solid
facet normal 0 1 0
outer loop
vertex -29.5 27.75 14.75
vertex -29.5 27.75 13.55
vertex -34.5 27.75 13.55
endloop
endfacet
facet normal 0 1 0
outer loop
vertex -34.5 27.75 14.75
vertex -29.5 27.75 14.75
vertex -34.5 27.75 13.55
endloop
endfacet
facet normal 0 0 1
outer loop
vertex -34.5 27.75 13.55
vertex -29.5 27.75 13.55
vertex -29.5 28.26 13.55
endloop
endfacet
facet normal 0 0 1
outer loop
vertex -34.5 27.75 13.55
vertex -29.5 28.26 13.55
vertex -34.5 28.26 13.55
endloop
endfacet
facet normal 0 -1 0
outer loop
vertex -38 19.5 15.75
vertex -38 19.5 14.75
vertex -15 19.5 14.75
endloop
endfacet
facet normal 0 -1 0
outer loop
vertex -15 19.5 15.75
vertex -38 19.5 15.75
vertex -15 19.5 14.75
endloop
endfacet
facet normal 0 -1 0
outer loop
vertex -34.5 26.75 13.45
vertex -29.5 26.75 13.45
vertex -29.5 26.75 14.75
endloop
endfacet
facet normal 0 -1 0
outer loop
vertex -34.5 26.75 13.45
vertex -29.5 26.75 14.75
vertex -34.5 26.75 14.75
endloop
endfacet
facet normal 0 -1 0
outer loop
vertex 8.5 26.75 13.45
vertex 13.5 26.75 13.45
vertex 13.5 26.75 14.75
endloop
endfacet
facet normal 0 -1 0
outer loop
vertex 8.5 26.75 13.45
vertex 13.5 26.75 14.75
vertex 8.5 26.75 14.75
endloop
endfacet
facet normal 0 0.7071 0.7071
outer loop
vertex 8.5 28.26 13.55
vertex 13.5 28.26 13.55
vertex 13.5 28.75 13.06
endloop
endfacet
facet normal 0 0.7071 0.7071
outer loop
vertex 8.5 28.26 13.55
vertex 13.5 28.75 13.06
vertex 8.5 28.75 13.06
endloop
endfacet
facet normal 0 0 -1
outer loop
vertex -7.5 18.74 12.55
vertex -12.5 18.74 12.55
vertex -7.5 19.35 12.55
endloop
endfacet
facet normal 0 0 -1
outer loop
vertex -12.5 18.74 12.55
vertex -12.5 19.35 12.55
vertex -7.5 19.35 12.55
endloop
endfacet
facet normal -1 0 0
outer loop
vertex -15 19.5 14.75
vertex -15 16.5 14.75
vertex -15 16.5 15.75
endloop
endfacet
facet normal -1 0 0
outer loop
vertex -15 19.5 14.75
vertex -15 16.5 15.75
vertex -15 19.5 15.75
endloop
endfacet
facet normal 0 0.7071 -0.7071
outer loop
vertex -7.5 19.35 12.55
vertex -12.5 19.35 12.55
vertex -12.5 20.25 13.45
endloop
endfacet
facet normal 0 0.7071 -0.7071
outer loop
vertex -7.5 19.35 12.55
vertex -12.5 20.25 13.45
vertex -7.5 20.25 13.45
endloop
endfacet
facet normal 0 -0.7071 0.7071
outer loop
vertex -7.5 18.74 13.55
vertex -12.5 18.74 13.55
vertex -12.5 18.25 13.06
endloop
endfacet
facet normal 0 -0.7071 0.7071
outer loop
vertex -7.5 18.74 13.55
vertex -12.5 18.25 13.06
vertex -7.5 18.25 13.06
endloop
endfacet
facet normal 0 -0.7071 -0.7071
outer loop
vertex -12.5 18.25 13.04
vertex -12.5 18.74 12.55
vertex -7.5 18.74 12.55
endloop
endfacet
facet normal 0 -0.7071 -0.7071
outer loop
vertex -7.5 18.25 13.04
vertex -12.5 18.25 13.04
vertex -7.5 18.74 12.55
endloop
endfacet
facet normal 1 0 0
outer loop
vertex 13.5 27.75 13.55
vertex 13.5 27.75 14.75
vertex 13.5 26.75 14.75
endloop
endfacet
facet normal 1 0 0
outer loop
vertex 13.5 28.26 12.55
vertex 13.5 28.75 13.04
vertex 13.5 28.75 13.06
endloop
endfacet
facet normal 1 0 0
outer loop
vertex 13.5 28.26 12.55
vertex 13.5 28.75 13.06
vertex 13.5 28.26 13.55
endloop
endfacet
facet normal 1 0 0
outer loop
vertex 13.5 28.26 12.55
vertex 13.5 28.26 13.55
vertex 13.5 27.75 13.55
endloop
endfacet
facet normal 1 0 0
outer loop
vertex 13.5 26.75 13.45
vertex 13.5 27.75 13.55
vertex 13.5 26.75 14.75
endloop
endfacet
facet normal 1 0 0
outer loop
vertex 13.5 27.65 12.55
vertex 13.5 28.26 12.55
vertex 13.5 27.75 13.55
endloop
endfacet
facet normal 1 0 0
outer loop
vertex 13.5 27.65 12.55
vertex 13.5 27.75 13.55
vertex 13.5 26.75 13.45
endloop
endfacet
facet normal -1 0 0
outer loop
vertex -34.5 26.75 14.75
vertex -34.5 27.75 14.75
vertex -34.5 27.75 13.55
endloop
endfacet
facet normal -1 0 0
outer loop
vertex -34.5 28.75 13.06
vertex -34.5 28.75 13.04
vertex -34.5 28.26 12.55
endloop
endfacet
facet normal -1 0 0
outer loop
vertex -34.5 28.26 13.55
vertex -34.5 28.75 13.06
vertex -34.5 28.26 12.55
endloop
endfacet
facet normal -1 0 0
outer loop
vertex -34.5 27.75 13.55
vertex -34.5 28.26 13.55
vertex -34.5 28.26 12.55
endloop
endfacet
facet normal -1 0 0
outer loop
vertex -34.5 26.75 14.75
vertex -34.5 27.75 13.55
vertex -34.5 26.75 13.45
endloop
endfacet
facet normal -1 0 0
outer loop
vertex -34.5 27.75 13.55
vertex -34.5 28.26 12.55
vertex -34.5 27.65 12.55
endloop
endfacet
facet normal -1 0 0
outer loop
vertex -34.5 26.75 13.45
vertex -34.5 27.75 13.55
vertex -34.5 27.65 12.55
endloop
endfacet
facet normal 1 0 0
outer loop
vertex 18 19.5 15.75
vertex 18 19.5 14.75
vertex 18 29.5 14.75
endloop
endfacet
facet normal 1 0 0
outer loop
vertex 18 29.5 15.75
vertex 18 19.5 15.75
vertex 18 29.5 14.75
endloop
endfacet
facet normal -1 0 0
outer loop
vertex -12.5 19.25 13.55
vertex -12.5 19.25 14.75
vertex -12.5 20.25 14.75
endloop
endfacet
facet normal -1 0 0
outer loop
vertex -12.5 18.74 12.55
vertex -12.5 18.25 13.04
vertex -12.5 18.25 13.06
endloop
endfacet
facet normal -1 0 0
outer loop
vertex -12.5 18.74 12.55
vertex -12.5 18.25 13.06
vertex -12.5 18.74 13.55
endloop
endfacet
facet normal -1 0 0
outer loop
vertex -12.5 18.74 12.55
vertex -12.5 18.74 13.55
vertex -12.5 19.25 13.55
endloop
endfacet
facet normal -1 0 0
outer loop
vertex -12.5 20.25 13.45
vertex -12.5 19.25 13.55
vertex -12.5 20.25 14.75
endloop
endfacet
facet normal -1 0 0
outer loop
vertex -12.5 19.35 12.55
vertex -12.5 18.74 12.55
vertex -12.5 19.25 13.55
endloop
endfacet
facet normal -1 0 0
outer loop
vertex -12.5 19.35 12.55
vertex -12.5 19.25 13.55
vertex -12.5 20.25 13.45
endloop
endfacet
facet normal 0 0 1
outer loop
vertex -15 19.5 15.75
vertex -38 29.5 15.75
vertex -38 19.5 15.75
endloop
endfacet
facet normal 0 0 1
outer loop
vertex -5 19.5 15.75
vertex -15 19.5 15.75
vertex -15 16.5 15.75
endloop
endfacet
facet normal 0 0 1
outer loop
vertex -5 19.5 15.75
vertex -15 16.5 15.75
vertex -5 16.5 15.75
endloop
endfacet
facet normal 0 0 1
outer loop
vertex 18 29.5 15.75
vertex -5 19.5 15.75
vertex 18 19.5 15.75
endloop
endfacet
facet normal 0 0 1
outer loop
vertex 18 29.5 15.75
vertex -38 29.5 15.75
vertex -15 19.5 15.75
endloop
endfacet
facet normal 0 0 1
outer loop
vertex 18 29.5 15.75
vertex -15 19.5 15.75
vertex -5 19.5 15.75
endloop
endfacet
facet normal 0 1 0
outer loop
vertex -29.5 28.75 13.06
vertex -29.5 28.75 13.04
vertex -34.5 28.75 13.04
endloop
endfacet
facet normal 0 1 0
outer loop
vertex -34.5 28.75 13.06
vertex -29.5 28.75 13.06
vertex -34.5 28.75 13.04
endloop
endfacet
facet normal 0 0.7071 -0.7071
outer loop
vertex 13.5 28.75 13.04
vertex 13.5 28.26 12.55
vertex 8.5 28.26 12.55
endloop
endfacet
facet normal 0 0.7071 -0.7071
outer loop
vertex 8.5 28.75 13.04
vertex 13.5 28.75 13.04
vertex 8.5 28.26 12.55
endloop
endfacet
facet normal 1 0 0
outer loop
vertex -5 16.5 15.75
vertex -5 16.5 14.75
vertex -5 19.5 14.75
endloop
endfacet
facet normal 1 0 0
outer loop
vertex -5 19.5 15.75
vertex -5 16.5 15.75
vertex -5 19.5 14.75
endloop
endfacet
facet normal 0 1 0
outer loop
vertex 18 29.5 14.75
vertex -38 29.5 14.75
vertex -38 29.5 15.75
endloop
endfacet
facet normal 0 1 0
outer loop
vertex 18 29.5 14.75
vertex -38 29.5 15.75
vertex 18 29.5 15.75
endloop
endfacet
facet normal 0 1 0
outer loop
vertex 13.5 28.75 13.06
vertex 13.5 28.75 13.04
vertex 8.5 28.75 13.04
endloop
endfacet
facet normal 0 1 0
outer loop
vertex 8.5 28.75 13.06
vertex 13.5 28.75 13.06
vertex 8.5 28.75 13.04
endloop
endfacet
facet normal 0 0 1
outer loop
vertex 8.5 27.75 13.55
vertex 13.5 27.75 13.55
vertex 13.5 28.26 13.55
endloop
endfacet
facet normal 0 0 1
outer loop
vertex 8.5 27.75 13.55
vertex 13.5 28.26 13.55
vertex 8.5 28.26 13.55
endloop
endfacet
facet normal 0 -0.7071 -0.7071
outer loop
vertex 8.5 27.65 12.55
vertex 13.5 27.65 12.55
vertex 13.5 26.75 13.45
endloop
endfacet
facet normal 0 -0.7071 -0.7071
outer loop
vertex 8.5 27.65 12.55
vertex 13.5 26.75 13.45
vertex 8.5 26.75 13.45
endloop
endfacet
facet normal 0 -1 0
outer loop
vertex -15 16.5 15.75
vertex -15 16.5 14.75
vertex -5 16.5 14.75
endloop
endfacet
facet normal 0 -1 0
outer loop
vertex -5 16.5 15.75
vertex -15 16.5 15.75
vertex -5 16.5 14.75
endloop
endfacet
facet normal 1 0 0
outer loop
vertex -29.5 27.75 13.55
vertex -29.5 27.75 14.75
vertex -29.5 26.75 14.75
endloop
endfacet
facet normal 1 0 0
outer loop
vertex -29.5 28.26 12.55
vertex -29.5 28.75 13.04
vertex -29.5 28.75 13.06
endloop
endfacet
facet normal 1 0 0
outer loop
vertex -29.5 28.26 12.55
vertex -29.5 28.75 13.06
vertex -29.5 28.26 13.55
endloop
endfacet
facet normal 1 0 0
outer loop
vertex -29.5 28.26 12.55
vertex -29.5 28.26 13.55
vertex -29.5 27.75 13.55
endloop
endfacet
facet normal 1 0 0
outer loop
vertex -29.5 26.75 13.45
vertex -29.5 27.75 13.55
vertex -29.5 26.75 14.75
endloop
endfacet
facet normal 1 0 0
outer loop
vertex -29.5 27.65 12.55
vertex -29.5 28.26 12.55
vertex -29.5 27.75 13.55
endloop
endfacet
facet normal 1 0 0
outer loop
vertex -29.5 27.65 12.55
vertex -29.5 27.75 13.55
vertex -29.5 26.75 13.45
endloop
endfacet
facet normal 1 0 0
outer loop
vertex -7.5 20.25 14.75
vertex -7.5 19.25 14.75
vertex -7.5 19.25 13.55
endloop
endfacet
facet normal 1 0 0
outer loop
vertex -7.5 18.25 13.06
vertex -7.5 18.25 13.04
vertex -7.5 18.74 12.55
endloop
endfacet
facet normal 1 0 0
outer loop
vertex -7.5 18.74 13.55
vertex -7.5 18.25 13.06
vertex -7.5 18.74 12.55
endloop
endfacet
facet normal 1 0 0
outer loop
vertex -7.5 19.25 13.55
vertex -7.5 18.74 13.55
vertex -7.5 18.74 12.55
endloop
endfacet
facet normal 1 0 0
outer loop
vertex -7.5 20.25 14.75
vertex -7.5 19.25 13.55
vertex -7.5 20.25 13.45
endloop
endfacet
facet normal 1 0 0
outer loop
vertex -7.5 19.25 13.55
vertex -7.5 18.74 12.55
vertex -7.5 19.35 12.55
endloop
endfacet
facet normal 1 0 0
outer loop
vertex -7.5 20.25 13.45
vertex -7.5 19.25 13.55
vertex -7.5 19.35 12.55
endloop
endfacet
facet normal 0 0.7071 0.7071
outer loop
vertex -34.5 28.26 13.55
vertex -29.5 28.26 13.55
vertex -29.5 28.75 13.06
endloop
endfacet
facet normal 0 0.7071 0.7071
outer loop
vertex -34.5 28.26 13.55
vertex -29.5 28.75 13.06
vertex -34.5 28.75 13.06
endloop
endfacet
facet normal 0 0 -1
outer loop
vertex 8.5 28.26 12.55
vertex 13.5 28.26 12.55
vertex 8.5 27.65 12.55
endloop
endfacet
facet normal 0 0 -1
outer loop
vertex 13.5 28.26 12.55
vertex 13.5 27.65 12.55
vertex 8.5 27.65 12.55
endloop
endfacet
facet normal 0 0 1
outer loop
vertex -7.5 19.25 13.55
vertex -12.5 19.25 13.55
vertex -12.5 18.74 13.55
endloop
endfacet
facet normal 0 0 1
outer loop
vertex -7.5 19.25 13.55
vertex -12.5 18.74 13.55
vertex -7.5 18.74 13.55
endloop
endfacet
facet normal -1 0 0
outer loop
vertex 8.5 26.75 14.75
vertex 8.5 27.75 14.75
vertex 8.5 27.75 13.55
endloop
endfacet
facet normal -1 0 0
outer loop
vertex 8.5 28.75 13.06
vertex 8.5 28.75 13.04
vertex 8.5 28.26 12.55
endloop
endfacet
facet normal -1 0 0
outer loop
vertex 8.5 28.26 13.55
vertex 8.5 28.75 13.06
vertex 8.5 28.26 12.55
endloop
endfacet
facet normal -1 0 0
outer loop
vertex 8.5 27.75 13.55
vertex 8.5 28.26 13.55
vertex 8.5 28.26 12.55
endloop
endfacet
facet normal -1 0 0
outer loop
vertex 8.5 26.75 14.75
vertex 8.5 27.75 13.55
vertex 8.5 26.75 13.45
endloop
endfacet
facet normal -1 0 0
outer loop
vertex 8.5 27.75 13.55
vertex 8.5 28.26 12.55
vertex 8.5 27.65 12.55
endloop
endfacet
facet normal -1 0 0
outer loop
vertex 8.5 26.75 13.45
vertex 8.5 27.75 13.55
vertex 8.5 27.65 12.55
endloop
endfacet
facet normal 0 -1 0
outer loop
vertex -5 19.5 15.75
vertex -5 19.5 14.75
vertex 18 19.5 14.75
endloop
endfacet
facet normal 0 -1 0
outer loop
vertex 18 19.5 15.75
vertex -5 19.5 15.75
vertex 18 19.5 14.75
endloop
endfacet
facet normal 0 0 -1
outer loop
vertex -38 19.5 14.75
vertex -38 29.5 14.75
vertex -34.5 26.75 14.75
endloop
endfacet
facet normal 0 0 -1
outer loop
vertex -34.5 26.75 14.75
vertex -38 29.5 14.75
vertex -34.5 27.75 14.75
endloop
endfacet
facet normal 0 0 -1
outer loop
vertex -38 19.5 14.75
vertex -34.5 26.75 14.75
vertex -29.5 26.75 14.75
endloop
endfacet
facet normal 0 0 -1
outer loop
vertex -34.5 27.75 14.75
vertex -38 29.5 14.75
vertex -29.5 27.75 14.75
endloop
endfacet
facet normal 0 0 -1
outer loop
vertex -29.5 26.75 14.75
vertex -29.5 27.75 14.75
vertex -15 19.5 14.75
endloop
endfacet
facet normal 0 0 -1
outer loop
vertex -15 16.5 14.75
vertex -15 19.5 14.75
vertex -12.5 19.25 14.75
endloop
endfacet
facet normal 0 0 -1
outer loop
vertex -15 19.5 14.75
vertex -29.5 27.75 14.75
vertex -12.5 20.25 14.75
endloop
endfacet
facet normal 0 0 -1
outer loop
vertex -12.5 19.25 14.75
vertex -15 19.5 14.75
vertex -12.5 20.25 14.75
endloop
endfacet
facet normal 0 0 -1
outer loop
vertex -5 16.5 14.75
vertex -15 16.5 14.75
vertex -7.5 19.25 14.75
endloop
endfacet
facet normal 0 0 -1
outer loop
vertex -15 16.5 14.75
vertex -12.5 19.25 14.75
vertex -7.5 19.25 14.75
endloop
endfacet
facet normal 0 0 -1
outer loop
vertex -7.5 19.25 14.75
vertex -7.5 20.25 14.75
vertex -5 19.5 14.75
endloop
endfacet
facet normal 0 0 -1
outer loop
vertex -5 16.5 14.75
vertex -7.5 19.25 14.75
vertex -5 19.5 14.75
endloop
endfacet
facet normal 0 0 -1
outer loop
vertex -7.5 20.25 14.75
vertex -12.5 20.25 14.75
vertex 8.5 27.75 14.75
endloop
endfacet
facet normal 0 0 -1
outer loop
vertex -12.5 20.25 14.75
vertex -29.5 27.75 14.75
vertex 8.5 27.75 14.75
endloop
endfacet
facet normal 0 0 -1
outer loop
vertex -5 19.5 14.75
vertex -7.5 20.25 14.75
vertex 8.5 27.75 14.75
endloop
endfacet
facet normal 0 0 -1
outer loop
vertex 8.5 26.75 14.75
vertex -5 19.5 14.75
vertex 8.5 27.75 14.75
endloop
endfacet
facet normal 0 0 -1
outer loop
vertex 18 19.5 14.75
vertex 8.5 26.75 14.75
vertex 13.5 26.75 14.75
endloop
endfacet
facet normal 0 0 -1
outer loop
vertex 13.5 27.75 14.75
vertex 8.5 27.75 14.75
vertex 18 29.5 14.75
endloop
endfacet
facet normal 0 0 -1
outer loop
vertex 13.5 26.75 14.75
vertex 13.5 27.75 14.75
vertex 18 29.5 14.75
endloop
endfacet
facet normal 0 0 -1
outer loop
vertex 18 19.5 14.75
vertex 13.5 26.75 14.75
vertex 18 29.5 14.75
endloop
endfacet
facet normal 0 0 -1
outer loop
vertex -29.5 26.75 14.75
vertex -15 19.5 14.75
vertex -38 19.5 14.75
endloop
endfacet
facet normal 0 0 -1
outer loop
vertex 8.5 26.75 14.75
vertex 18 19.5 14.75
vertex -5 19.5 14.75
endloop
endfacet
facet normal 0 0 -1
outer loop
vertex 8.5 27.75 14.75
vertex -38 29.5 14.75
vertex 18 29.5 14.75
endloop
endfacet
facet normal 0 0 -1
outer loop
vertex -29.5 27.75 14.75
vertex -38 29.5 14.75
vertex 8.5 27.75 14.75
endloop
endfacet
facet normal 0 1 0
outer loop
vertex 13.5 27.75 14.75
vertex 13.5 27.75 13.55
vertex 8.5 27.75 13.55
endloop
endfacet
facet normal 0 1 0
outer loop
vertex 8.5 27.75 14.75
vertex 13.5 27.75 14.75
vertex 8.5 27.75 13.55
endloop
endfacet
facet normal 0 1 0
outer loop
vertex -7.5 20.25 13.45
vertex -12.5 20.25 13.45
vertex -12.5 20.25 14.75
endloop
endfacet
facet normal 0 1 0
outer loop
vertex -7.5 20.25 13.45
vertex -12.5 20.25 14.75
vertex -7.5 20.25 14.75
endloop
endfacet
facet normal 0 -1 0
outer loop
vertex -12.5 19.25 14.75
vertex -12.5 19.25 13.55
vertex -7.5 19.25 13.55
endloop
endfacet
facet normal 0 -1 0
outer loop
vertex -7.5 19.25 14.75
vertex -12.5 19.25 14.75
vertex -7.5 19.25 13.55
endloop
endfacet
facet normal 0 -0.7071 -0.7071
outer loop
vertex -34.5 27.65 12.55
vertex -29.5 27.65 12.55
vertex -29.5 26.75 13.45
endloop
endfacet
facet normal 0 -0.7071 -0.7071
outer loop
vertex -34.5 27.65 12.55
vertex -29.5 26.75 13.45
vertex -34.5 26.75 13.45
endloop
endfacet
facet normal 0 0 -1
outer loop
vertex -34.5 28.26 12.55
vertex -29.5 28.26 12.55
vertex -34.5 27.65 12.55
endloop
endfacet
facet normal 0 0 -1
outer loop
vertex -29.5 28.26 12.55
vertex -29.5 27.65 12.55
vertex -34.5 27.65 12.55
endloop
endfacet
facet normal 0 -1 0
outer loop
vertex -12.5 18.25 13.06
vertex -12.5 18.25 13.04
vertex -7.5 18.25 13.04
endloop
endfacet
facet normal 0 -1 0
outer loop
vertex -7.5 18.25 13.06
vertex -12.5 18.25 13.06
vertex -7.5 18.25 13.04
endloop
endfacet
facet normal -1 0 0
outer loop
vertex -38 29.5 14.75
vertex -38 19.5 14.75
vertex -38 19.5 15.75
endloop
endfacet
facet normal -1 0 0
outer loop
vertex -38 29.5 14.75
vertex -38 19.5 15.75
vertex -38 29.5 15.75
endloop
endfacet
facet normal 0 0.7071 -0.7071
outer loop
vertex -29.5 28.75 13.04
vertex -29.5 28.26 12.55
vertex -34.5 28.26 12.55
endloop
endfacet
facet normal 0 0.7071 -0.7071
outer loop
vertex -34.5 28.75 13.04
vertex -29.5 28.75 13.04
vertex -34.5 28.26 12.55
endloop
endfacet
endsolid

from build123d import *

# Parameters (mm, degrees)
BOX082_W                  = 56
BOX082_H                  = 10
BOX082_DEPTH              = 1
BOX081_W                  = 10
BOX081_H                  = 10
BOX081_DEPTH              = 1
BOX085_W                  = 5
BOX085_H                  = 1
BOX085_DEPTH              = 1
CHAMFER013_SIZE           = 0.49
BOX086_W                  = 5
BOX086_H                  = 1
BOX086_DEPTH              = 2.2
CHAMFER014_SIZE           = 0.9
FUSION078_PLACEMENT_ANGLE = 180
BOX088_W                  = 5
BOX088_H                  = 1
BOX088_DEPTH              = 1
CHAMFER015_SIZE           = 0.49
BOX087_W                  = 5
BOX087_H                  = 1
BOX087_DEPTH              = 2.2
CHAMFER016_SIZE           = 0.9
FUSION079_PLACEMENT_ANGLE = 180
BOX083_W                  = 5
BOX083_H                  = 1
BOX083_DEPTH              = 1
CHAMFER011_SIZE           = 0.49
BOX084_W                  = 5
BOX084_H                  = 1
BOX084_DEPTH              = 2.2
CHAMFER012_SIZE           = 0.9


with BuildPart() as w_rfel056:
    # Box082 → Box082 (new body)
    with BuildSketch(Plane(origin=(-38, 19.5, 14.75), x_dir=(1, 0, 0), z_dir=(0, 0, 1))):
        with Locations((28, 5)):
            Rectangle(BOX082_W, BOX082_H)
    extrude(amount=BOX082_DEPTH)


with BuildPart() as deckl:
    # Box081 → Box081 (new body)
    with BuildSketch(Plane(origin=(-15, 16.5, 14.75), x_dir=(1, 0, 0), z_dir=(0, 0, 1))):
        with Locations((5, 5)):
            Rectangle(BOX081_W, BOX081_H)
    extrude(amount=BOX081_DEPTH)

    # Fusion077: union Würfel056
    add(w_rfel056.part)


with BuildPart() as chamfer013:
    # Box085 → Box085 (new body)
    with BuildSketch(Plane(origin=(-12.5, 18.25, 12.75), x_dir=(1, 0, 0), z_dir=(0, 0, 1))):
        with Locations((2.5, 0.5)):
            Rectangle(BOX085_W, BOX085_H)
    extrude(amount=BOX085_DEPTH)

    # Chamfer013
    chamfer013_edges = [chamfer013.edges().sort_by_distance(p)[0] for p in [
        (-10, 18.25, 12.75),
        (-10, 18.25, 13.75),
    ]]
    chamfer(chamfer013_edges, length=CHAMFER013_SIZE)


with BuildPart() as chamfer013_1:
    # Chamfer013 placement: moved
    add(chamfer013.part.moved(Location((0, 0, -0.2))))


with BuildPart() as nase001:
    # Box086 → Box086 (new body)
    with BuildSketch(Plane(origin=(-12.5, 19.25, 12.55), x_dir=(1, 0, 0), z_dir=(0, 0, 1))):
        with Locations((2.5, 0.5)):
            Rectangle(BOX086_W, BOX086_H)
    extrude(amount=BOX086_DEPTH)

    # Chamfer014
    chamfer014_edges = [nase001.edges().sort_by_distance(p)[0] for p in [
        (-10, 20.25, 12.55),
    ]]
    chamfer(chamfer014_edges, length=CHAMFER014_SIZE)

    # Fusion078: union Chamfer013
    add(chamfer013_1.part)


with BuildPart() as nase001_1:
    # Fusion078 placement: moved
    add(nase001.part.moved(Location((1, 47, 0))).rotate(Axis((1, 47, 0), (0, 0, 1)), FUSION078_PLACEMENT_ANGLE))


with BuildPart() as chamfer015:
    # Box088 → Box088 (new body)
    with BuildSketch(Plane(origin=(-12.5, 18.25, 12.75), x_dir=(1, 0, 0), z_dir=(0, 0, 1))):
        with Locations((2.5, 0.5)):
            Rectangle(BOX088_W, BOX088_H)
    extrude(amount=BOX088_DEPTH)

    # Chamfer015
    chamfer015_edges = [chamfer015.edges().sort_by_distance(p)[0] for p in [
        (-10, 18.25, 12.75),
        (-10, 18.25, 13.75),
    ]]
    chamfer(chamfer015_edges, length=CHAMFER015_SIZE)


with BuildPart() as chamfer015_1:
    # Chamfer015 placement: moved
    add(chamfer015.part.moved(Location((0, 0, -0.2))))


with BuildPart() as nase002:
    # Box087 → Box087 (new body)
    with BuildSketch(Plane(origin=(-12.5, 19.25, 12.55), x_dir=(1, 0, 0), z_dir=(0, 0, 1))):
        with Locations((2.5, 0.5)):
            Rectangle(BOX087_W, BOX087_H)
    extrude(amount=BOX087_DEPTH)

    # Chamfer016
    chamfer016_edges = [nase002.edges().sort_by_distance(p)[0] for p in [
        (-10, 20.25, 12.55),
    ]]
    chamfer(chamfer016_edges, length=CHAMFER016_SIZE)

    # Fusion079: union Chamfer015
    add(chamfer015_1.part)


with BuildPart() as nase002_1:
    # Fusion079 placement: moved
    add(nase002.part.moved(Location((-42, 47, 0))).rotate(Axis((-42, 47, 0), (0, 0, 1)), FUSION079_PLACEMENT_ANGLE))


with BuildPart() as chamfer011:
    # Box083 → Box083 (new body)
    with BuildSketch(Plane(origin=(-12.5, 18.25, 12.75), x_dir=(1, 0, 0), z_dir=(0, 0, 1))):
        with Locations((2.5, 0.5)):
            Rectangle(BOX083_W, BOX083_H)
    extrude(amount=BOX083_DEPTH)

    # Chamfer011
    chamfer011_edges = [chamfer011.edges().sort_by_distance(p)[0] for p in [
        (-10, 18.25, 12.75),
        (-10, 18.25, 13.75),
    ]]
    chamfer(chamfer011_edges, length=CHAMFER011_SIZE)


with BuildPart() as chamfer011_1:
    # Chamfer011 placement: moved
    add(chamfer011.part.moved(Location((0, 0, -0.2))))


with BuildPart() as abdeckung_gpio:
    # Box084 → Box084 (new body)
    with BuildSketch(Plane(origin=(-12.5, 19.25, 12.55), x_dir=(1, 0, 0), z_dir=(0, 0, 1))):
        with Locations((2.5, 0.5)):
            Rectangle(BOX084_W, BOX084_H)
    extrude(amount=BOX084_DEPTH)

    # Chamfer012
    chamfer012_edges = [abdeckung_gpio.edges().sort_by_distance(p)[0] for p in [
        (-10, 20.25, 12.55),
    ]]
    chamfer(chamfer012_edges, length=CHAMFER012_SIZE)

    # Fusion076: union Chamfer011
    add(chamfer011_1.part)

    # Fusion080: union Nase001, Nase002
    add(nase001_1.part)
    add(nase002_1.part)

    # Fusion081: union Deckl
    add(deckl.part)


solid = abdeckung_gpio.part
